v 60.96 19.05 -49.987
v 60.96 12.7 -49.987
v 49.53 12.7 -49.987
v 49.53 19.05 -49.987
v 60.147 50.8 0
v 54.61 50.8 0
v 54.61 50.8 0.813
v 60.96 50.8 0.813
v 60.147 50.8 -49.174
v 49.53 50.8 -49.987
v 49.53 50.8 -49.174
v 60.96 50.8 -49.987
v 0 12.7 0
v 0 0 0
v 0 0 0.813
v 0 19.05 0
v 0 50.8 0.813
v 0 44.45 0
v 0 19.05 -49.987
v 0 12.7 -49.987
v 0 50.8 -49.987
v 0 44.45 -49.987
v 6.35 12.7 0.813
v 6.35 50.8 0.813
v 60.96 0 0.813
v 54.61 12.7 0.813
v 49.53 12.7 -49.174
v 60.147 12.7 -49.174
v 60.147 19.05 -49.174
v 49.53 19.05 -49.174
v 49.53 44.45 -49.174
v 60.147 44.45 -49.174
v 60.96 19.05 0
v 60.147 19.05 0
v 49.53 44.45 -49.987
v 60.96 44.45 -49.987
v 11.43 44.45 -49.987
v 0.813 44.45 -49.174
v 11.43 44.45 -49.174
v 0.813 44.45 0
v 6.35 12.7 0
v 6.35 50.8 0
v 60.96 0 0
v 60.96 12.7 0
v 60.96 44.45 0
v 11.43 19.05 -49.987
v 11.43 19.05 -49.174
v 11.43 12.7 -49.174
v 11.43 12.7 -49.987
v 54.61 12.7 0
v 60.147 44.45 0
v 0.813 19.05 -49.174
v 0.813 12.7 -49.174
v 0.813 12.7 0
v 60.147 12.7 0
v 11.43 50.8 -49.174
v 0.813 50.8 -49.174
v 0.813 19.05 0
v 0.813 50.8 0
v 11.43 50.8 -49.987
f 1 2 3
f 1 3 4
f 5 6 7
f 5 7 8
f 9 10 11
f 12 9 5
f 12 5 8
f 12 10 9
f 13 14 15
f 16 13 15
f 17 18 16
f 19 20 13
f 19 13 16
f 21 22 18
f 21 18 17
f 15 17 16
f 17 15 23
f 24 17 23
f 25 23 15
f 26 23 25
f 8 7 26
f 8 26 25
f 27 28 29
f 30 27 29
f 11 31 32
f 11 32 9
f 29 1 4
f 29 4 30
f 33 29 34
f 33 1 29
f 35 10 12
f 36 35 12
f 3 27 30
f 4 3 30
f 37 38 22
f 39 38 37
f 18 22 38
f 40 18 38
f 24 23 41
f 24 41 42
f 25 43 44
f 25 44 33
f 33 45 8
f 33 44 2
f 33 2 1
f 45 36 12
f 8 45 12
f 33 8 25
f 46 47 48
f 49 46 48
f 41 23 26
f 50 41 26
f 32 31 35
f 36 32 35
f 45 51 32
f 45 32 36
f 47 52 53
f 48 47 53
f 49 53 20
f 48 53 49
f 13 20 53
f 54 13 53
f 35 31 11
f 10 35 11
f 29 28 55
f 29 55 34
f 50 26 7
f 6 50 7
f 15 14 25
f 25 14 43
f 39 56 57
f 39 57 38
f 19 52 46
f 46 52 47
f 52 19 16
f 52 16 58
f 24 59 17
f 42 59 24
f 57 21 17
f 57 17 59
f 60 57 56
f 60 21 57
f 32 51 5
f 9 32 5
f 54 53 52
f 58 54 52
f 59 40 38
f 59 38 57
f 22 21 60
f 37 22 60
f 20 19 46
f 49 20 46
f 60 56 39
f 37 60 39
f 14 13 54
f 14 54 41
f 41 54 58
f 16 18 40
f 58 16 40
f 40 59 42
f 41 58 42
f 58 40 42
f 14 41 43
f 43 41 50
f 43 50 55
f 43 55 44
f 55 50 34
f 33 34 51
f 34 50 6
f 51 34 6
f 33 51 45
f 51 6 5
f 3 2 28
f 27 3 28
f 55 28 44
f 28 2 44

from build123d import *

# Parameters (mm, degrees)
F0_W     = 60.96
F0_H     = 50.8
F1_DEPTH = 0.8128
F2_W     = 48.26
F2_H     = 38.1
F3_DEPTH = 25.4
F4_W     = 0.8128
F4_H     = 6.35
F5_DEPTH = 50.8
F6_W     = 6.35
F6_H     = 0.8128
F7_DEPTH = 11.43
F8_W     = 6.35
F8_H     = 0.8128
F9_DEPTH = 11.43


with BuildPart() as f1:
    # F0 (on Top) → F1 (new body)
    with BuildSketch(Plane.XY):
        with Locations((30.48, 25.4)):
            Rectangle(F0_W, F0_H)
    extrude(amount=F1_DEPTH)

    # F2 (on face) → F3 (cut)
    with BuildSketch(Plane.XY.offset(0.8128)):
        with Locations((30.48, 31.75)):
            Rectangle(F2_W, F2_H)
    extrude(amount=-F3_DEPTH, mode=Mode.SUBTRACT)

    # F4 (on face) → F5 (join)
    with BuildSketch(Plane.XY.offset(0.8128)):
        with Locations((0.4064, 47.625)):
            Rectangle(F4_W, F4_H)
        with Locations((60.5536, 47.625)):
            Rectangle(F4_W, F4_H)
        with Locations((0.4064, 15.875)):
            Rectangle(F4_W, F4_H)
        with Locations((60.5536, 15.875)):
            Rectangle(F4_W, F4_H)
    extrude(amount=-F5_DEPTH)

    # F6 (on face) → F7 (join)
    with BuildSketch(Plane.YZ.offset(60.96)):
        with Locations((15.875, -49.5808)):
            Rectangle(F6_W, F6_H)
        with Locations((47.625, -49.5808)):
            Rectangle(F6_W, F6_H)
    extrude(amount=-F7_DEPTH)

    # F8 (on face) → F9 (join)
    with BuildSketch(Plane(origin=(0, 0, 0), x_dir=(0, -1, 0), z_dir=(-1, 0, 0))):
        with Locations((-47.625, -49.5808)):
            Rectangle(F8_W, F8_H)
        with Locations((-15.875, -49.5808)):
            Rectangle(F8_W, F8_H)
    extrude(amount=-F9_DEPTH)


solid = f1.part
